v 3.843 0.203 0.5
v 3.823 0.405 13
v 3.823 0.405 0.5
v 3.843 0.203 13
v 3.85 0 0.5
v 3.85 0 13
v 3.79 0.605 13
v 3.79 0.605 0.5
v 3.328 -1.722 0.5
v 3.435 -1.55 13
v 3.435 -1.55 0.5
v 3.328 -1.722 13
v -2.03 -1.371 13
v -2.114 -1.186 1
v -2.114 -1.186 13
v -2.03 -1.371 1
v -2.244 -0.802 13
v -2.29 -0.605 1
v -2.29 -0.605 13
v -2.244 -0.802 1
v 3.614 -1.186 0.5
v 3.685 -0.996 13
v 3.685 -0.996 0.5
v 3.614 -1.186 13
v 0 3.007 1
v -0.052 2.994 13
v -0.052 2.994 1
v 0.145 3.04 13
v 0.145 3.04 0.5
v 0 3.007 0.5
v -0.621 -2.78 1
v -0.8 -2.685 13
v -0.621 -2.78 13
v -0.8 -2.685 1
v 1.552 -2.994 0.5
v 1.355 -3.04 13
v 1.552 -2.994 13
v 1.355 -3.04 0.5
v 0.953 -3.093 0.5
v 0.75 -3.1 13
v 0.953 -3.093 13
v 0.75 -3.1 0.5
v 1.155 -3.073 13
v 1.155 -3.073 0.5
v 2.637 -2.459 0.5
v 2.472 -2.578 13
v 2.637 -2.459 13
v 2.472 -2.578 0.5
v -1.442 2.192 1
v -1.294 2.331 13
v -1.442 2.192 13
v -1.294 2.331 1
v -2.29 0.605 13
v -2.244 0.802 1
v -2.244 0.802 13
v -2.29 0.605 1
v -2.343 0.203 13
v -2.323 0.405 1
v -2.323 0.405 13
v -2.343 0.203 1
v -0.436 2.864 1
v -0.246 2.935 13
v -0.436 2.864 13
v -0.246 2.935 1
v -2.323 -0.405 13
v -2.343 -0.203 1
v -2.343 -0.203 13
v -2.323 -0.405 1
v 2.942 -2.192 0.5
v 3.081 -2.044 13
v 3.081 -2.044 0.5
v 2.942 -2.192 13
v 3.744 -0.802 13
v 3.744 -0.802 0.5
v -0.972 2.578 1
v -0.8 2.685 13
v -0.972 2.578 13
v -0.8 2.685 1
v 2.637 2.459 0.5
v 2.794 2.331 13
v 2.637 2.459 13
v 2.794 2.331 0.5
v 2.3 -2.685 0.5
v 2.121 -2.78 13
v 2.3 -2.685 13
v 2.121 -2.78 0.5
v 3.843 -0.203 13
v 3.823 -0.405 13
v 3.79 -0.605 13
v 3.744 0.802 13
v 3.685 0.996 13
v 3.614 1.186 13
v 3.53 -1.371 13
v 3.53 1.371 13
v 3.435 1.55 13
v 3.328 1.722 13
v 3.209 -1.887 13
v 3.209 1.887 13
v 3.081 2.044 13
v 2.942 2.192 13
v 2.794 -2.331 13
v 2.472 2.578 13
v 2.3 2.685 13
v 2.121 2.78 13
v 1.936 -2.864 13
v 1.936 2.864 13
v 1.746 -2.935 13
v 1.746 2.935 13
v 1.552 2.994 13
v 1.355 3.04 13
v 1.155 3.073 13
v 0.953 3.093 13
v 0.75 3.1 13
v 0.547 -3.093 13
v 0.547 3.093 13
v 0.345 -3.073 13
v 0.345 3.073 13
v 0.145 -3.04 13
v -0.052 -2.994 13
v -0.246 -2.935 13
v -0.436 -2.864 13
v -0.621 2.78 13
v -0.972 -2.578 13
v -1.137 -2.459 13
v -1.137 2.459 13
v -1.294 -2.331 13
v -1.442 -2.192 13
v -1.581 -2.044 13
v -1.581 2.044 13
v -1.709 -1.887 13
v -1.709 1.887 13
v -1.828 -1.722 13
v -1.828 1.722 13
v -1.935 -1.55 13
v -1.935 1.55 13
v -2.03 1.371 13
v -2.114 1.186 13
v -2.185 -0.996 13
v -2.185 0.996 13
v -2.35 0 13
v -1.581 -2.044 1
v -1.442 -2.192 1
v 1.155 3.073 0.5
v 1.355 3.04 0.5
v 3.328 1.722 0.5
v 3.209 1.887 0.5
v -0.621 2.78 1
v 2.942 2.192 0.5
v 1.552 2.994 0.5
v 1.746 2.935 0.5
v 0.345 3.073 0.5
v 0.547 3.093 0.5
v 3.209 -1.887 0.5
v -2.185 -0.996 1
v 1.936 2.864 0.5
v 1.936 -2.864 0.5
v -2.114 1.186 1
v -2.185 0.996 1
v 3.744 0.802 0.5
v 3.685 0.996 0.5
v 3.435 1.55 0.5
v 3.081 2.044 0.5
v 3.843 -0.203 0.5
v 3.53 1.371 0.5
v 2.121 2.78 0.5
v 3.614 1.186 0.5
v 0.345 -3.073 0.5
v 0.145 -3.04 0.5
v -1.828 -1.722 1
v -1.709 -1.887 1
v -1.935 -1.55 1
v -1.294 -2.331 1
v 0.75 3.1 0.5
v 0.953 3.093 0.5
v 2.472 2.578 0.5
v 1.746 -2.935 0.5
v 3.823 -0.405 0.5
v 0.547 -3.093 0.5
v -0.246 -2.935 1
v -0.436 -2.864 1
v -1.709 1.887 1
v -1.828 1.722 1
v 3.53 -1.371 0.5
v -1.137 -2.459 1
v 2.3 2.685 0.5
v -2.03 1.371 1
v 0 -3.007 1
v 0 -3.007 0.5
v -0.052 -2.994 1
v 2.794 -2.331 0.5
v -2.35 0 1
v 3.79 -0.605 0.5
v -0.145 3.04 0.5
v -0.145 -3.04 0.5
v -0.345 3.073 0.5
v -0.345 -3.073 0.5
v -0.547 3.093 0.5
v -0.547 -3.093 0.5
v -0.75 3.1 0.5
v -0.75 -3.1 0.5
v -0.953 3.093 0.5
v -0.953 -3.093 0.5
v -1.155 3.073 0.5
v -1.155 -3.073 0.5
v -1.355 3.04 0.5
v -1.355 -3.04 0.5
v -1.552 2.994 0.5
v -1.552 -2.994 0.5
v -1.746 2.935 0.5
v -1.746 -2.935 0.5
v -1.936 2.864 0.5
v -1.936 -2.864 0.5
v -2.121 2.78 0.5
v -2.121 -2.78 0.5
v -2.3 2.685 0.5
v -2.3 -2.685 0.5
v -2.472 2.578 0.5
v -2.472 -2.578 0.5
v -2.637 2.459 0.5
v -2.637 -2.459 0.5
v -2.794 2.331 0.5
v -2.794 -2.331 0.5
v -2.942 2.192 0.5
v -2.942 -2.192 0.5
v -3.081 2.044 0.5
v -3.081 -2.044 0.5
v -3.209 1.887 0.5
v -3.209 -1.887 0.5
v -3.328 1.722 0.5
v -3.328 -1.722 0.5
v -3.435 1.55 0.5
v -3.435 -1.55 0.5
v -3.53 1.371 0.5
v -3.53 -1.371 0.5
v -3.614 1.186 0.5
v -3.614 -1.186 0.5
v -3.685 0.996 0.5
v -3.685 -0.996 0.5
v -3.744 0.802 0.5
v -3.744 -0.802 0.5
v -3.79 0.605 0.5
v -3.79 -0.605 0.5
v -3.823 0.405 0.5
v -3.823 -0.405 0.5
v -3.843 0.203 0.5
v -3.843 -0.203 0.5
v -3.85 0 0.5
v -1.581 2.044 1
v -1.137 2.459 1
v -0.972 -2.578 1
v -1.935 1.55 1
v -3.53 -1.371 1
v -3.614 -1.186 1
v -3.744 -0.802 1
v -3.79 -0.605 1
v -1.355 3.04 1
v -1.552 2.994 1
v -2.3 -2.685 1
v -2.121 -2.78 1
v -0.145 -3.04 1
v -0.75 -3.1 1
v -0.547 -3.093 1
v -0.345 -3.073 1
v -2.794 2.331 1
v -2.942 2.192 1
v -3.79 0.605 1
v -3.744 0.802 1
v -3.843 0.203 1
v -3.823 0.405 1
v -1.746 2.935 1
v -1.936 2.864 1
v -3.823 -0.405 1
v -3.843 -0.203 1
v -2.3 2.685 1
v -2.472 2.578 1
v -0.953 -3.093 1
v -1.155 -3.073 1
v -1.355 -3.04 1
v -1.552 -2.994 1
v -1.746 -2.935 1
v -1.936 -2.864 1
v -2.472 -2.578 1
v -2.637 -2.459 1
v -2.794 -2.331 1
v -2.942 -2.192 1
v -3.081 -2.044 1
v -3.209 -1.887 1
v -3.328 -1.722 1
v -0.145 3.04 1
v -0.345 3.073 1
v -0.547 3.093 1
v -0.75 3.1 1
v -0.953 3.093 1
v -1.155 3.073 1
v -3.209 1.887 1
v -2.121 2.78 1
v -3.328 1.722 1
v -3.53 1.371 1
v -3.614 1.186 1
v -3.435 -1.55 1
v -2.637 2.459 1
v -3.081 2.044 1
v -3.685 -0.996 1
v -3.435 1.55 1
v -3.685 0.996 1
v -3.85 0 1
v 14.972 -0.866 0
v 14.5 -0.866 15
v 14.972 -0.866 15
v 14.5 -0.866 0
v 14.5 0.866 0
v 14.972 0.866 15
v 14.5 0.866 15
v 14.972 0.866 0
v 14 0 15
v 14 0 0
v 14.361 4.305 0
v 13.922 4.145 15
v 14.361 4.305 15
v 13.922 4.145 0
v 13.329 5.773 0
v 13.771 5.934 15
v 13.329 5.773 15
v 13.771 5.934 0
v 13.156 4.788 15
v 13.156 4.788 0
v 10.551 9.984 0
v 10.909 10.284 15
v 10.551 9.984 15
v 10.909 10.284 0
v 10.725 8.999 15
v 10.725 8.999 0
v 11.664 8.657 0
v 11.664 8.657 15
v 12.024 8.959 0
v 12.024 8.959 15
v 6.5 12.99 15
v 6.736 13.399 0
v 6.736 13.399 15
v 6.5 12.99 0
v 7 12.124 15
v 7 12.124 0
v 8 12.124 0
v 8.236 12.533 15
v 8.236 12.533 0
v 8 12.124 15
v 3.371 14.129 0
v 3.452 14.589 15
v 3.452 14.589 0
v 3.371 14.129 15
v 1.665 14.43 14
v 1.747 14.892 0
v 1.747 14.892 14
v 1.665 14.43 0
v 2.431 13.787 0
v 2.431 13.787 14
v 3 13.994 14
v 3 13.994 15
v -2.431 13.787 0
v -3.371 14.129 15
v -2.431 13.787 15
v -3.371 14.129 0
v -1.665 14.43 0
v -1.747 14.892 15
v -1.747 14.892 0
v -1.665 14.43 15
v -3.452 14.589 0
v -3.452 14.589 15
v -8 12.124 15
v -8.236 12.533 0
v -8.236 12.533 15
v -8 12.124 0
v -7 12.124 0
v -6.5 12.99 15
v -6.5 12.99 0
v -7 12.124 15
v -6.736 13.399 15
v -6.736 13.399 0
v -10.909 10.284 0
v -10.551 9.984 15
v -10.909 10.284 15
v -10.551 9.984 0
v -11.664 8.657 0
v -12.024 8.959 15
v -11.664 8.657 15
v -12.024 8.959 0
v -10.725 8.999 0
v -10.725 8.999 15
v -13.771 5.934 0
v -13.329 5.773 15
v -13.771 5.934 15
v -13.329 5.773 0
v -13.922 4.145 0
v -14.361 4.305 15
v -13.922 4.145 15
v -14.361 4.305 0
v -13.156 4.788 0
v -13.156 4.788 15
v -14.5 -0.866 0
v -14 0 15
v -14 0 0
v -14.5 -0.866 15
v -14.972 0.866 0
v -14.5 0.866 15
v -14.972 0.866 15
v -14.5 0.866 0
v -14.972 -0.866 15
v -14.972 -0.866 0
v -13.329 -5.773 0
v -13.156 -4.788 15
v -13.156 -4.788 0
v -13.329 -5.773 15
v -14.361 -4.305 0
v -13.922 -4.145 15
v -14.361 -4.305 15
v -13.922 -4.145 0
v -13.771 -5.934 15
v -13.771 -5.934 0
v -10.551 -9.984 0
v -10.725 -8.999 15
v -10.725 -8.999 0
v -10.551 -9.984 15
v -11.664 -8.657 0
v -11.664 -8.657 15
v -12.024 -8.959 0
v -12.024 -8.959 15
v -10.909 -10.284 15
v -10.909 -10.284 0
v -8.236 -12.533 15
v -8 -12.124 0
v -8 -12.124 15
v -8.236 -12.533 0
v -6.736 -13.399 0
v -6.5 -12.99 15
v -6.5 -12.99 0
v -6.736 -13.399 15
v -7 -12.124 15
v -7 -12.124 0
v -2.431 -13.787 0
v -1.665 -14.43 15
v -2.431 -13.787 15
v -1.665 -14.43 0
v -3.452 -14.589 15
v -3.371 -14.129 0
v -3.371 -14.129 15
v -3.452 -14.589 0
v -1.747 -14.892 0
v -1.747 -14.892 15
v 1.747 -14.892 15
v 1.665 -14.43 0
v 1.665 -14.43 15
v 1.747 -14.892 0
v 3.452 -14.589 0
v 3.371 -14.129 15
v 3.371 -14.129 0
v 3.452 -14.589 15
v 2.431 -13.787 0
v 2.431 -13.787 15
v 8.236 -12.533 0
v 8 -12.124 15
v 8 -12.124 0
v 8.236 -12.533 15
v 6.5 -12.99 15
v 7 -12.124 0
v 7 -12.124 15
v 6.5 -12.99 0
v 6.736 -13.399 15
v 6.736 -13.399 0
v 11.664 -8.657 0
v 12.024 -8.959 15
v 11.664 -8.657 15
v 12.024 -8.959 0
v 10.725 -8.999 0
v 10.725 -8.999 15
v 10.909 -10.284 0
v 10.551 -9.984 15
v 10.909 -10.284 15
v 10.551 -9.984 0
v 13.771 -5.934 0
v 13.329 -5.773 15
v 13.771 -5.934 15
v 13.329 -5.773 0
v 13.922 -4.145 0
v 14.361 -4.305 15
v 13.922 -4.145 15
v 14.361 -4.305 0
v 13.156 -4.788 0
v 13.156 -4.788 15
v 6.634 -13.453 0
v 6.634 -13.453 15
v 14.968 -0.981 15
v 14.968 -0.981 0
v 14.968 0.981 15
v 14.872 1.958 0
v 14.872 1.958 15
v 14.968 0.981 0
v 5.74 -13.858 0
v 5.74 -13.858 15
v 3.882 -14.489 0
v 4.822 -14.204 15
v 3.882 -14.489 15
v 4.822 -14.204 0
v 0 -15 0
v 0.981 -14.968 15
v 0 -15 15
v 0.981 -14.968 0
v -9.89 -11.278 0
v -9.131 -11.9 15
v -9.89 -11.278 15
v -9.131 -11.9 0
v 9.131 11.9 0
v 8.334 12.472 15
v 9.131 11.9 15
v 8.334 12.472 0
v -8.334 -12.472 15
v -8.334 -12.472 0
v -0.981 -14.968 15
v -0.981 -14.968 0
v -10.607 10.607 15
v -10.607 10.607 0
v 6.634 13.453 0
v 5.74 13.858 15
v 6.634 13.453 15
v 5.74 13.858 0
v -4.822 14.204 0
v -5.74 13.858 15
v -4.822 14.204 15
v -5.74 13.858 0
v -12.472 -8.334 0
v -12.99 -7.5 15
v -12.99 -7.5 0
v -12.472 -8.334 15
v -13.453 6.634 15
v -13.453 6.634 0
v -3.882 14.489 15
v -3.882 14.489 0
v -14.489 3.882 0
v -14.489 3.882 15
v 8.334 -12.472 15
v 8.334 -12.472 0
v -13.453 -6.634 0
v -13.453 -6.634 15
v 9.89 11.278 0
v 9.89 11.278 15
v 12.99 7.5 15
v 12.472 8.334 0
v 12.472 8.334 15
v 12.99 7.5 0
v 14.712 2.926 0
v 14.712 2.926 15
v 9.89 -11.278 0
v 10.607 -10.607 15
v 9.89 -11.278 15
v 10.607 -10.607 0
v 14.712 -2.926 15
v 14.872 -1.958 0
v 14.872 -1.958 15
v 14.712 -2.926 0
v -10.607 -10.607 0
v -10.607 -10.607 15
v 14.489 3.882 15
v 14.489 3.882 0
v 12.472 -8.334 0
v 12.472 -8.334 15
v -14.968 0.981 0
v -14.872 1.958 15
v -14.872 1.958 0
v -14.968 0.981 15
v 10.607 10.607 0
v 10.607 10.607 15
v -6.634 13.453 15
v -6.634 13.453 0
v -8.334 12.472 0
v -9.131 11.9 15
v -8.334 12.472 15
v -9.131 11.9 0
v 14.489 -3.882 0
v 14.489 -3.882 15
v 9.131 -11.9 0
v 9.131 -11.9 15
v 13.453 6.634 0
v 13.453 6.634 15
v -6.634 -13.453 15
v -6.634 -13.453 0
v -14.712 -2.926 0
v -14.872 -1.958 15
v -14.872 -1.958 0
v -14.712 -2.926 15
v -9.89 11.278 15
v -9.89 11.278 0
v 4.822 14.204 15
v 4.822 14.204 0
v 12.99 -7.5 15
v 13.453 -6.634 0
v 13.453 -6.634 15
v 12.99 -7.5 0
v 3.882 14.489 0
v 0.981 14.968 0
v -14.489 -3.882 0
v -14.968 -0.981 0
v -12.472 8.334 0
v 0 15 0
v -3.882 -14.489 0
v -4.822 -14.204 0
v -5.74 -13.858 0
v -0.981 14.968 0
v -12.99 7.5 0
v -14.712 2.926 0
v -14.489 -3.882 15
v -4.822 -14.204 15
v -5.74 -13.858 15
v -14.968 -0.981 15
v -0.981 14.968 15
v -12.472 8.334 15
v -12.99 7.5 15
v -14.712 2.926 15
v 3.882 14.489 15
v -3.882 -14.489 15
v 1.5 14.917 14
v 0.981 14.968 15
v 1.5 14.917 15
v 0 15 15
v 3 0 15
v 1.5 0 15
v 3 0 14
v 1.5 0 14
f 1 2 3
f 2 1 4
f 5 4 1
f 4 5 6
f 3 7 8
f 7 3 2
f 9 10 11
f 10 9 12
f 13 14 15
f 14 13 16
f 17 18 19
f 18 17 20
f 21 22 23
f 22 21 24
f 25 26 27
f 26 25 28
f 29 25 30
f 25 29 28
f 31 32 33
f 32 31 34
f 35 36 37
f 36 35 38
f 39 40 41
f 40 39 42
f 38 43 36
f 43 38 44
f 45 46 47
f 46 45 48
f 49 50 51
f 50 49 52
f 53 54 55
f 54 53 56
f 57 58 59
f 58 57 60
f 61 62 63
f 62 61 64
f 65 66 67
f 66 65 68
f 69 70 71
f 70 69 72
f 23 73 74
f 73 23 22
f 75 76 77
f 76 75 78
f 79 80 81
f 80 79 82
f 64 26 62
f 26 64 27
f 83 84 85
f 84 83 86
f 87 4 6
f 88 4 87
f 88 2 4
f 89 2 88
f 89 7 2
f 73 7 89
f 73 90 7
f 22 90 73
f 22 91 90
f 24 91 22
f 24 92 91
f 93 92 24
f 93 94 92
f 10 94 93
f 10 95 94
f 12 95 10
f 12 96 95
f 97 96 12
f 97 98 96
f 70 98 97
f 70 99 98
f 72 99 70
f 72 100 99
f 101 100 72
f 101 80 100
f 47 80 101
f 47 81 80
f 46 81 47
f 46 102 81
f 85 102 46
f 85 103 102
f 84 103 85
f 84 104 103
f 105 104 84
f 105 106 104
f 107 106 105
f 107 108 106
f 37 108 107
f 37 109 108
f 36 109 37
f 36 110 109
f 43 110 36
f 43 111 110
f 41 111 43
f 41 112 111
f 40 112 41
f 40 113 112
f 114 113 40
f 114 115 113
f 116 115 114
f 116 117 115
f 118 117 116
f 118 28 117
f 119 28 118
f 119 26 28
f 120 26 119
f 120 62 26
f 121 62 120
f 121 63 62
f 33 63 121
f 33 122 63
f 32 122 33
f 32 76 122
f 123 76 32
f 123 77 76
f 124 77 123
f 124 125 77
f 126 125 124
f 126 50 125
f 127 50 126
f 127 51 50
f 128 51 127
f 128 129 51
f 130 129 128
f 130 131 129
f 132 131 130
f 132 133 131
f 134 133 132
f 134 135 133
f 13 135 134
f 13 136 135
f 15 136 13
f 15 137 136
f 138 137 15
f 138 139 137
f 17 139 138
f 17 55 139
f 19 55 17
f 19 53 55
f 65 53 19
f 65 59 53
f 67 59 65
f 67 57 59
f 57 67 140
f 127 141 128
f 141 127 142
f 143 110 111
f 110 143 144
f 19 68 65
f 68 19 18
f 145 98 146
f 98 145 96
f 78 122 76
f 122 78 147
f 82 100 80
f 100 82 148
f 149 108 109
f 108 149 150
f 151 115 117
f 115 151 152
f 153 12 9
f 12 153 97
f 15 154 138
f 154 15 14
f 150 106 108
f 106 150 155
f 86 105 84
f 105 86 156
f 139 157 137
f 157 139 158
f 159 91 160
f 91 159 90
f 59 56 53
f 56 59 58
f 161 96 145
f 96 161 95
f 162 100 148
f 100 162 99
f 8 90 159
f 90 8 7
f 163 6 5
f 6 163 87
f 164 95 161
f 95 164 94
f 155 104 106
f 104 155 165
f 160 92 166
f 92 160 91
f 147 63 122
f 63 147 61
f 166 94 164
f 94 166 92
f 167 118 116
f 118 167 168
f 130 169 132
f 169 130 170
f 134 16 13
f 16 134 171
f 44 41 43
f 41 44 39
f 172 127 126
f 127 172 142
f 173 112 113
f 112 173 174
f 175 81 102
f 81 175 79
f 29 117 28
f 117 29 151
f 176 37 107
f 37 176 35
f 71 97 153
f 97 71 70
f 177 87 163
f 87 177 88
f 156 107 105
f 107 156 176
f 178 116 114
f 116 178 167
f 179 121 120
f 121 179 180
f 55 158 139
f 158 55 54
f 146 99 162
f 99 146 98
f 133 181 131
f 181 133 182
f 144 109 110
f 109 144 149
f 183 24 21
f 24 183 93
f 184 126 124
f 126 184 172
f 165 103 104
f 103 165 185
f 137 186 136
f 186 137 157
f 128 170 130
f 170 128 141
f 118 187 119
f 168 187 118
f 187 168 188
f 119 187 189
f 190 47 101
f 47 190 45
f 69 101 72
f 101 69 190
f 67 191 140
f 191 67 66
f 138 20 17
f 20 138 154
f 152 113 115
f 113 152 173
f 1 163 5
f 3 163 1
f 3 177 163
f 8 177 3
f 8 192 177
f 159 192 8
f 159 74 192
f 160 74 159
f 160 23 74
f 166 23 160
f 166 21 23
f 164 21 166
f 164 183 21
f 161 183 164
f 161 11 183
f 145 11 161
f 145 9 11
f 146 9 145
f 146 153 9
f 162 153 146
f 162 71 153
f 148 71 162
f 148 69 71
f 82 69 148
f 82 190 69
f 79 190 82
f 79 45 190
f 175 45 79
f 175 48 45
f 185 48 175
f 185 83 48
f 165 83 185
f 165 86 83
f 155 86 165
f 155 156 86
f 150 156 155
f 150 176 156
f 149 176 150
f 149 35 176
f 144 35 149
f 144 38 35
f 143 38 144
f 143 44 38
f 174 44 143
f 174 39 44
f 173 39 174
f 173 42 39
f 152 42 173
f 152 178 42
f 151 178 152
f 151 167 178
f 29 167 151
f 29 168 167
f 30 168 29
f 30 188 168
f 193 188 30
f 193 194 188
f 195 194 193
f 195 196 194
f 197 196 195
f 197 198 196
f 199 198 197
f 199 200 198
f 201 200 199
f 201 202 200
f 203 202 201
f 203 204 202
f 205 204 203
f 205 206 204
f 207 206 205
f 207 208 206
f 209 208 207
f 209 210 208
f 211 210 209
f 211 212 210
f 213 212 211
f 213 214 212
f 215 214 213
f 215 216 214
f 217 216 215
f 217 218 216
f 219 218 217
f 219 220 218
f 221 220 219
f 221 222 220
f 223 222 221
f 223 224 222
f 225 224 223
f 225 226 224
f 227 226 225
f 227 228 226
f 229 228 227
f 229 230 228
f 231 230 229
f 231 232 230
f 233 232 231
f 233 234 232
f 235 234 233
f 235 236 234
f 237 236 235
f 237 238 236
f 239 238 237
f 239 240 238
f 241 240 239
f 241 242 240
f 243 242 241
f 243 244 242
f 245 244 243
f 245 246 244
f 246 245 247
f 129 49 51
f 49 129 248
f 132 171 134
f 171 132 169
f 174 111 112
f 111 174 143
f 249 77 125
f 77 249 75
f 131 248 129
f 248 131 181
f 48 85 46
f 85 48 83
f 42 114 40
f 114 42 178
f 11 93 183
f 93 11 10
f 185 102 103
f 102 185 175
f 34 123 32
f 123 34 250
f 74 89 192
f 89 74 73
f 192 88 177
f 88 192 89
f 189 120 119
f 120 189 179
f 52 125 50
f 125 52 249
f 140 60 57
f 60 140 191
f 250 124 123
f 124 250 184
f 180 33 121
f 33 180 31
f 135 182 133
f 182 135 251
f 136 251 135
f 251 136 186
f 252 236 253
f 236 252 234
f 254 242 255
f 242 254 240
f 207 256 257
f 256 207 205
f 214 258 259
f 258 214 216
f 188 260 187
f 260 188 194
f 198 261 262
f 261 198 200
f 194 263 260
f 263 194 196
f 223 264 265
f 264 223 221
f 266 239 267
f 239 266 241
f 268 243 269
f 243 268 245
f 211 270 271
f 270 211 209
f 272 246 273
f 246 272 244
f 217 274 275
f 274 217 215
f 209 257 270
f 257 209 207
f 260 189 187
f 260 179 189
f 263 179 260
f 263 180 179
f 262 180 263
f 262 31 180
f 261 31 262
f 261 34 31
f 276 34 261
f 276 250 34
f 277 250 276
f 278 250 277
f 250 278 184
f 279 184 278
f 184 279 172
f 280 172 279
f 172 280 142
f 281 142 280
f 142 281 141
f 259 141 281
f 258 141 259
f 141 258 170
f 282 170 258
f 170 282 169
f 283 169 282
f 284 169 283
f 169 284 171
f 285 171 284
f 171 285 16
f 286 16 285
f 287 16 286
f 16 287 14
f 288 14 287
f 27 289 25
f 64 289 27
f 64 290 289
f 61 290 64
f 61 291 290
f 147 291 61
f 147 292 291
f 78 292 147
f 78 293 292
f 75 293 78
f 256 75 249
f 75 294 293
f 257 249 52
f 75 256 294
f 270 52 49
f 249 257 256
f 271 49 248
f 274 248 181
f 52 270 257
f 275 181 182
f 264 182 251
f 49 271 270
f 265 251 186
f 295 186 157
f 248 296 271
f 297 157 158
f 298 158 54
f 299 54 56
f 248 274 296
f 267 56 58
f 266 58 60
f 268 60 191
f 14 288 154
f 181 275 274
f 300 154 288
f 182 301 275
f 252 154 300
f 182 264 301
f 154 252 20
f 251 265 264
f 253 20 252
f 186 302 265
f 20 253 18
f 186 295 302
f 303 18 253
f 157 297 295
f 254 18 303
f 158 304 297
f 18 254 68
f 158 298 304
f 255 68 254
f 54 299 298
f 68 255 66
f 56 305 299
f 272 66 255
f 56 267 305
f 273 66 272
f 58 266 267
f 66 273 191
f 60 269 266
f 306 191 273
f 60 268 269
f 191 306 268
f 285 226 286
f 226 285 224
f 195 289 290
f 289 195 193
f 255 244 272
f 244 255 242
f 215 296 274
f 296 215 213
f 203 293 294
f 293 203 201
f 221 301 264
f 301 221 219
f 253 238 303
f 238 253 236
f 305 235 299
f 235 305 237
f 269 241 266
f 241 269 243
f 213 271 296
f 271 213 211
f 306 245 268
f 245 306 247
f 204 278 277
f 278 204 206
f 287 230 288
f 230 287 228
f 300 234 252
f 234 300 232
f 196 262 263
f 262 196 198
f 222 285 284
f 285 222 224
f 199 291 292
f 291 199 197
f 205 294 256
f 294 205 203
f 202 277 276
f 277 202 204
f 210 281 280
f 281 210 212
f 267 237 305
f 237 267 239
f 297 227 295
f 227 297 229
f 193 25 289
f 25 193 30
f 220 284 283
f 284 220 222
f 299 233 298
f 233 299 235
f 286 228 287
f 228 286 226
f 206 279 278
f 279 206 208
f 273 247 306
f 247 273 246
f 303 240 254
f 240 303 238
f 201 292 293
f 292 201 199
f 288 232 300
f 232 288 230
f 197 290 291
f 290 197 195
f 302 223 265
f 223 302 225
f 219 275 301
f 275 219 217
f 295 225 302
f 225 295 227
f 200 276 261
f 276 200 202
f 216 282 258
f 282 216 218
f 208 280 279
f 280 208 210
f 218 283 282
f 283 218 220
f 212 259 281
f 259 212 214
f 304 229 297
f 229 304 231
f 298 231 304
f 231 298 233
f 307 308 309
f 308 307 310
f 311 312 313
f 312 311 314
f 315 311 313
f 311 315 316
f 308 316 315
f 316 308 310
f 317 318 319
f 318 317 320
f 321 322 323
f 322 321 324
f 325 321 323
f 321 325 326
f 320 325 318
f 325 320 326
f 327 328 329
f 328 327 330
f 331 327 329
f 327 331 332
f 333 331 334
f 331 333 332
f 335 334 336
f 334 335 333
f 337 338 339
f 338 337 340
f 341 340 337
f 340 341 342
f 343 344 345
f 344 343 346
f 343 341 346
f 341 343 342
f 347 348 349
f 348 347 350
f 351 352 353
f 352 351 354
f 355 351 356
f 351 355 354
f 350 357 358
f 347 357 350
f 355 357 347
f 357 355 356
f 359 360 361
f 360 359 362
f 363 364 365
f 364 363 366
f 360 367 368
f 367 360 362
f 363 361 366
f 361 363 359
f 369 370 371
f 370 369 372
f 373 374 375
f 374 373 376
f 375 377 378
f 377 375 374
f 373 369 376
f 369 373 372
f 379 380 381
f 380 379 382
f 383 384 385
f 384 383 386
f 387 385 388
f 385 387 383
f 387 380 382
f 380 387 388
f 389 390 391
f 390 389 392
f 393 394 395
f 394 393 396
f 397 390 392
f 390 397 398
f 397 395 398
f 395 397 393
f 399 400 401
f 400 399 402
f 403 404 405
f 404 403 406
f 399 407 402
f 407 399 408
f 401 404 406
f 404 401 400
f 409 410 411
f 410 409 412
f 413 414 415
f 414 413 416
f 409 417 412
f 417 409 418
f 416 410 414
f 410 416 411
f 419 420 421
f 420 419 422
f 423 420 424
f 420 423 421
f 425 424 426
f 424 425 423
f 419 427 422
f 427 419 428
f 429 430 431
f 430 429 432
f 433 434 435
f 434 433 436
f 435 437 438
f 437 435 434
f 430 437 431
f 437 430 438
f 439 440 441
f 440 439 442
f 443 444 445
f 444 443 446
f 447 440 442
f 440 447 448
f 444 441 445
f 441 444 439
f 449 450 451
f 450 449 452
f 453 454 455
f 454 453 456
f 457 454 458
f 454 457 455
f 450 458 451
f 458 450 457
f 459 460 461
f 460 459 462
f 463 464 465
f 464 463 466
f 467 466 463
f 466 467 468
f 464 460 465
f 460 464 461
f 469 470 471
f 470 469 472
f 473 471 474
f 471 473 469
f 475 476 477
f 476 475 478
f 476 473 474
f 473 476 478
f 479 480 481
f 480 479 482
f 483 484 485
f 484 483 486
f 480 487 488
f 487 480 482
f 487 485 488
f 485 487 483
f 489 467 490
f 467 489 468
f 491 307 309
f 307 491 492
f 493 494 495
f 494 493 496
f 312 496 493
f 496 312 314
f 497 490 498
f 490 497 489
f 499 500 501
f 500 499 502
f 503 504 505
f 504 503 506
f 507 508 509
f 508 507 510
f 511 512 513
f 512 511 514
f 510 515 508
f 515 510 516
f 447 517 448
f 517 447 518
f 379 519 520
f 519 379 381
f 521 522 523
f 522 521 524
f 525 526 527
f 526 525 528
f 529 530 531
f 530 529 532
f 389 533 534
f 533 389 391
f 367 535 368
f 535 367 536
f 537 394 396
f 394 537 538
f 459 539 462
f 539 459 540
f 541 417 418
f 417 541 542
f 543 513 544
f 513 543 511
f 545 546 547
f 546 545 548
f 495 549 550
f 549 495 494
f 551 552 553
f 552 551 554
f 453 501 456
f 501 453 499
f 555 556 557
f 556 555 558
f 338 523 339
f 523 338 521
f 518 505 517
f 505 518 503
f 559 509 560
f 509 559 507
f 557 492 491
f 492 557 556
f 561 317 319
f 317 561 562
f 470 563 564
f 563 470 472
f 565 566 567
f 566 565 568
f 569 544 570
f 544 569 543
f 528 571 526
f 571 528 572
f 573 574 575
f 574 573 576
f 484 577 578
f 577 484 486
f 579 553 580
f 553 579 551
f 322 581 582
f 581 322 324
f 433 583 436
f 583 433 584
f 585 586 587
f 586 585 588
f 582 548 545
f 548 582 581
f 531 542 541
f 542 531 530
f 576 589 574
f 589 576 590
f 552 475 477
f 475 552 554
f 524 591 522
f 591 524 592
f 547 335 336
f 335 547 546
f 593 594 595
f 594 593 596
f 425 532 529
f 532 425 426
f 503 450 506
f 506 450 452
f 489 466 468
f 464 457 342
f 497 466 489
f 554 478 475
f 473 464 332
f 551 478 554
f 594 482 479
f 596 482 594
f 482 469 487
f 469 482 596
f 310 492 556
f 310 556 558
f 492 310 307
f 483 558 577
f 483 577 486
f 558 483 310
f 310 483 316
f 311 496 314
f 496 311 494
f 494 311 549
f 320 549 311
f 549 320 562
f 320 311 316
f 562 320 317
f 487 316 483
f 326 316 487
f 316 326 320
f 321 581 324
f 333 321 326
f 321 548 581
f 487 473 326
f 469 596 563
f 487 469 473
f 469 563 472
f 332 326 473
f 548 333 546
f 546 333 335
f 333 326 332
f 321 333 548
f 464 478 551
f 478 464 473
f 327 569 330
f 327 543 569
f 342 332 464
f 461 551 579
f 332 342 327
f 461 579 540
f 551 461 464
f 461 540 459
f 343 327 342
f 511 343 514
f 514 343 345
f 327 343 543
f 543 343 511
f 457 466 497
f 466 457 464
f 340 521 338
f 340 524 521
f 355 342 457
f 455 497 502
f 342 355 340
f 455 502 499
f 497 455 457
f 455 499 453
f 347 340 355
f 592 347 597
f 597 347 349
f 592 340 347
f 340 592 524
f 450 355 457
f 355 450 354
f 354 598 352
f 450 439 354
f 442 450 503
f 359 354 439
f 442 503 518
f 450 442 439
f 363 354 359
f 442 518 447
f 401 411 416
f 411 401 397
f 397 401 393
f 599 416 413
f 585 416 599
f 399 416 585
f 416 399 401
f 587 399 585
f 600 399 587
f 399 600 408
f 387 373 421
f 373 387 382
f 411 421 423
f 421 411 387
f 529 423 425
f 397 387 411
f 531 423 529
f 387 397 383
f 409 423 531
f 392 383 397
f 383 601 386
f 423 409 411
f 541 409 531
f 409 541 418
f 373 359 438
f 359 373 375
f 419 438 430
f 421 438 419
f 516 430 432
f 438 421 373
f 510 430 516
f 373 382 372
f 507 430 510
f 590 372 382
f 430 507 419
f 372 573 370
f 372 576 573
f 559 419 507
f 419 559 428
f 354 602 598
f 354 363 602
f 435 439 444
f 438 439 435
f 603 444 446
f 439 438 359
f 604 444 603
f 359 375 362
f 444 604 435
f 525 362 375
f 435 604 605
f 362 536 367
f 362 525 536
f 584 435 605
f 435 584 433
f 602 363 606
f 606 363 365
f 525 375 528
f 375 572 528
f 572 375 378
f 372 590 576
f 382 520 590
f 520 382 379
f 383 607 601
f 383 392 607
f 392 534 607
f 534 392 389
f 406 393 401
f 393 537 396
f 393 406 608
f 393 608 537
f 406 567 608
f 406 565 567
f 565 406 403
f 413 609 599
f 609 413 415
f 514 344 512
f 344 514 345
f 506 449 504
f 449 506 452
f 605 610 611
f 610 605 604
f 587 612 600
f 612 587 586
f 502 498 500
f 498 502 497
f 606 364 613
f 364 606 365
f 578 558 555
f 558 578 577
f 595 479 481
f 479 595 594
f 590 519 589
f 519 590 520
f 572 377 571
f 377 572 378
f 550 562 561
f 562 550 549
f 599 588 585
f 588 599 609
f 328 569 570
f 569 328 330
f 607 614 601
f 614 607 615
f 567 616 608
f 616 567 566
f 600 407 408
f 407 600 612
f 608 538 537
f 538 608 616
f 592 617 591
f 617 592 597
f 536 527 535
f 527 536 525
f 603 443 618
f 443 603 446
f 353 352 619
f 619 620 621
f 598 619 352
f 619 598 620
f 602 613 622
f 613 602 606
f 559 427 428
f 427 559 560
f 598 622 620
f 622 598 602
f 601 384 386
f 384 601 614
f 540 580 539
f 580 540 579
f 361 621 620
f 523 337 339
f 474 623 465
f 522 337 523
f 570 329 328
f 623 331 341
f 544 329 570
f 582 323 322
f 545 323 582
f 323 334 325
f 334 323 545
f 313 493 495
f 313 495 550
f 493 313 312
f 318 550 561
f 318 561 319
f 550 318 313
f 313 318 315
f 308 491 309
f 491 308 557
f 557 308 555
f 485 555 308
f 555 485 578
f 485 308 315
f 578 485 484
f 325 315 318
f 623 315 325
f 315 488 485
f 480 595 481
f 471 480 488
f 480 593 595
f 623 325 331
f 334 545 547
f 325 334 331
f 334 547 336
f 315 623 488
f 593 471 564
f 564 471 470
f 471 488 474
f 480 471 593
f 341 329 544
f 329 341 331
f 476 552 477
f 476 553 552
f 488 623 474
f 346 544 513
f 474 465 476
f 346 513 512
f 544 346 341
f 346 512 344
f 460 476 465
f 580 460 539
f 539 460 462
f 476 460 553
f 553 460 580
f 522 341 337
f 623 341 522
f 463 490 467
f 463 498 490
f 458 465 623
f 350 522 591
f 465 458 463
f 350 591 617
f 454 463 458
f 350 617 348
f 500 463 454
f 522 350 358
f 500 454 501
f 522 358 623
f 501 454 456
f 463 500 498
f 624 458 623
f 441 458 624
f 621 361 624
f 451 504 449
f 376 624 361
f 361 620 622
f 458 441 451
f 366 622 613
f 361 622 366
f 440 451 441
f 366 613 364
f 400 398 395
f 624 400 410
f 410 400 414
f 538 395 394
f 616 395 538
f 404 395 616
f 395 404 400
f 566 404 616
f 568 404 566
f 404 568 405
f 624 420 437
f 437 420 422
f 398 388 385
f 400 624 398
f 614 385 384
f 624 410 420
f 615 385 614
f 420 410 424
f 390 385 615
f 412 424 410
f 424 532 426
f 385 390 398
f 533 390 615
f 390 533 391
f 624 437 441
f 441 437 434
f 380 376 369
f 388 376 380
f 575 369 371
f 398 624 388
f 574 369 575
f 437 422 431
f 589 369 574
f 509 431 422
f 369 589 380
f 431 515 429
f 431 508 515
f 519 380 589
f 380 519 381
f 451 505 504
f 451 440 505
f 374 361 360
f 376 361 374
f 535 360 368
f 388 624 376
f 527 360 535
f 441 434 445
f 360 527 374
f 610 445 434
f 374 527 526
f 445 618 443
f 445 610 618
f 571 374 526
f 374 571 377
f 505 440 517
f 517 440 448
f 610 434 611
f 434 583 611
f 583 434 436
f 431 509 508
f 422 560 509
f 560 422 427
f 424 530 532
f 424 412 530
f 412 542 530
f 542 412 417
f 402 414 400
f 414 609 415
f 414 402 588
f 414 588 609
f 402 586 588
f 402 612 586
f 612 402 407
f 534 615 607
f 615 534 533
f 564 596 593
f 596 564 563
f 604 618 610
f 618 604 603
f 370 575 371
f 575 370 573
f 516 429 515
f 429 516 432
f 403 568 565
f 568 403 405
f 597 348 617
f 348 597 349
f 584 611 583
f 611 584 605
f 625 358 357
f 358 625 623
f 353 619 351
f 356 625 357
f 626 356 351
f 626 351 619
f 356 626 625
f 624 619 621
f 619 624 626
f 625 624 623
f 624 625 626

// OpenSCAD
// Replacement knob for hotplate stirrer (D-shaft 6 mm)
// Print orientation: flat bottom face on bed (z = 0)

$fn = 96;

// --- Dimensions (mm) ---
knob_d        = 30;    // knob outer diameter
knob_h        = 15;    // knob height
bore_depth    = 12;    // D-bore depth from bottom face
bore_flat_w   = 4.7;   // width of D-bore (flat to opposite side)
bore_d        = 6.2;   // D-bore circle diameter
groove_count  = 18;    // number of grip grooves
groove_d      = 2;     // grip groove diameter
pointer_w     = 1.5;   // pointer groove width
pointer_d     = 1;     // pointer groove depth

eps           = 0.5;   // overcut for clean differences

// Derived
bore_r = bore_d / 2;
bore_x = (bore_d - bore_flat_w) / 2;   // offset of circle centre from flat

difference() {
    // Main body
    cylinder(d = knob_d, h = knob_h);

    // D-shaped blind bore from bottom face
    translate([0, 0, eps])
        union() {
            translate([bore_x, 0, 0])
                cylinder(r = bore_r, h = bore_depth + eps);
            translate([-bore_x, 0, 0])
                cylinder(r = bore_r, h = eps);
        }

    // Vertical grip grooves along full height
    for (i = [0 : groove_count - 1])
        rotate([0, 0, i * 360 / groove_count])
            translate([knob_d / 2, 0, -eps])
                cylinder(d = groove_d, h = knob_h + 2 * eps, $fn = 6);

    // Pointer groove from centre to outer edge (same side as flat)
    translate([bore_x + 0.75, 0, knob_h - pointer_d])
        cube([pointer_w, knob_d / 2 + 1, pointer_d]);
}
